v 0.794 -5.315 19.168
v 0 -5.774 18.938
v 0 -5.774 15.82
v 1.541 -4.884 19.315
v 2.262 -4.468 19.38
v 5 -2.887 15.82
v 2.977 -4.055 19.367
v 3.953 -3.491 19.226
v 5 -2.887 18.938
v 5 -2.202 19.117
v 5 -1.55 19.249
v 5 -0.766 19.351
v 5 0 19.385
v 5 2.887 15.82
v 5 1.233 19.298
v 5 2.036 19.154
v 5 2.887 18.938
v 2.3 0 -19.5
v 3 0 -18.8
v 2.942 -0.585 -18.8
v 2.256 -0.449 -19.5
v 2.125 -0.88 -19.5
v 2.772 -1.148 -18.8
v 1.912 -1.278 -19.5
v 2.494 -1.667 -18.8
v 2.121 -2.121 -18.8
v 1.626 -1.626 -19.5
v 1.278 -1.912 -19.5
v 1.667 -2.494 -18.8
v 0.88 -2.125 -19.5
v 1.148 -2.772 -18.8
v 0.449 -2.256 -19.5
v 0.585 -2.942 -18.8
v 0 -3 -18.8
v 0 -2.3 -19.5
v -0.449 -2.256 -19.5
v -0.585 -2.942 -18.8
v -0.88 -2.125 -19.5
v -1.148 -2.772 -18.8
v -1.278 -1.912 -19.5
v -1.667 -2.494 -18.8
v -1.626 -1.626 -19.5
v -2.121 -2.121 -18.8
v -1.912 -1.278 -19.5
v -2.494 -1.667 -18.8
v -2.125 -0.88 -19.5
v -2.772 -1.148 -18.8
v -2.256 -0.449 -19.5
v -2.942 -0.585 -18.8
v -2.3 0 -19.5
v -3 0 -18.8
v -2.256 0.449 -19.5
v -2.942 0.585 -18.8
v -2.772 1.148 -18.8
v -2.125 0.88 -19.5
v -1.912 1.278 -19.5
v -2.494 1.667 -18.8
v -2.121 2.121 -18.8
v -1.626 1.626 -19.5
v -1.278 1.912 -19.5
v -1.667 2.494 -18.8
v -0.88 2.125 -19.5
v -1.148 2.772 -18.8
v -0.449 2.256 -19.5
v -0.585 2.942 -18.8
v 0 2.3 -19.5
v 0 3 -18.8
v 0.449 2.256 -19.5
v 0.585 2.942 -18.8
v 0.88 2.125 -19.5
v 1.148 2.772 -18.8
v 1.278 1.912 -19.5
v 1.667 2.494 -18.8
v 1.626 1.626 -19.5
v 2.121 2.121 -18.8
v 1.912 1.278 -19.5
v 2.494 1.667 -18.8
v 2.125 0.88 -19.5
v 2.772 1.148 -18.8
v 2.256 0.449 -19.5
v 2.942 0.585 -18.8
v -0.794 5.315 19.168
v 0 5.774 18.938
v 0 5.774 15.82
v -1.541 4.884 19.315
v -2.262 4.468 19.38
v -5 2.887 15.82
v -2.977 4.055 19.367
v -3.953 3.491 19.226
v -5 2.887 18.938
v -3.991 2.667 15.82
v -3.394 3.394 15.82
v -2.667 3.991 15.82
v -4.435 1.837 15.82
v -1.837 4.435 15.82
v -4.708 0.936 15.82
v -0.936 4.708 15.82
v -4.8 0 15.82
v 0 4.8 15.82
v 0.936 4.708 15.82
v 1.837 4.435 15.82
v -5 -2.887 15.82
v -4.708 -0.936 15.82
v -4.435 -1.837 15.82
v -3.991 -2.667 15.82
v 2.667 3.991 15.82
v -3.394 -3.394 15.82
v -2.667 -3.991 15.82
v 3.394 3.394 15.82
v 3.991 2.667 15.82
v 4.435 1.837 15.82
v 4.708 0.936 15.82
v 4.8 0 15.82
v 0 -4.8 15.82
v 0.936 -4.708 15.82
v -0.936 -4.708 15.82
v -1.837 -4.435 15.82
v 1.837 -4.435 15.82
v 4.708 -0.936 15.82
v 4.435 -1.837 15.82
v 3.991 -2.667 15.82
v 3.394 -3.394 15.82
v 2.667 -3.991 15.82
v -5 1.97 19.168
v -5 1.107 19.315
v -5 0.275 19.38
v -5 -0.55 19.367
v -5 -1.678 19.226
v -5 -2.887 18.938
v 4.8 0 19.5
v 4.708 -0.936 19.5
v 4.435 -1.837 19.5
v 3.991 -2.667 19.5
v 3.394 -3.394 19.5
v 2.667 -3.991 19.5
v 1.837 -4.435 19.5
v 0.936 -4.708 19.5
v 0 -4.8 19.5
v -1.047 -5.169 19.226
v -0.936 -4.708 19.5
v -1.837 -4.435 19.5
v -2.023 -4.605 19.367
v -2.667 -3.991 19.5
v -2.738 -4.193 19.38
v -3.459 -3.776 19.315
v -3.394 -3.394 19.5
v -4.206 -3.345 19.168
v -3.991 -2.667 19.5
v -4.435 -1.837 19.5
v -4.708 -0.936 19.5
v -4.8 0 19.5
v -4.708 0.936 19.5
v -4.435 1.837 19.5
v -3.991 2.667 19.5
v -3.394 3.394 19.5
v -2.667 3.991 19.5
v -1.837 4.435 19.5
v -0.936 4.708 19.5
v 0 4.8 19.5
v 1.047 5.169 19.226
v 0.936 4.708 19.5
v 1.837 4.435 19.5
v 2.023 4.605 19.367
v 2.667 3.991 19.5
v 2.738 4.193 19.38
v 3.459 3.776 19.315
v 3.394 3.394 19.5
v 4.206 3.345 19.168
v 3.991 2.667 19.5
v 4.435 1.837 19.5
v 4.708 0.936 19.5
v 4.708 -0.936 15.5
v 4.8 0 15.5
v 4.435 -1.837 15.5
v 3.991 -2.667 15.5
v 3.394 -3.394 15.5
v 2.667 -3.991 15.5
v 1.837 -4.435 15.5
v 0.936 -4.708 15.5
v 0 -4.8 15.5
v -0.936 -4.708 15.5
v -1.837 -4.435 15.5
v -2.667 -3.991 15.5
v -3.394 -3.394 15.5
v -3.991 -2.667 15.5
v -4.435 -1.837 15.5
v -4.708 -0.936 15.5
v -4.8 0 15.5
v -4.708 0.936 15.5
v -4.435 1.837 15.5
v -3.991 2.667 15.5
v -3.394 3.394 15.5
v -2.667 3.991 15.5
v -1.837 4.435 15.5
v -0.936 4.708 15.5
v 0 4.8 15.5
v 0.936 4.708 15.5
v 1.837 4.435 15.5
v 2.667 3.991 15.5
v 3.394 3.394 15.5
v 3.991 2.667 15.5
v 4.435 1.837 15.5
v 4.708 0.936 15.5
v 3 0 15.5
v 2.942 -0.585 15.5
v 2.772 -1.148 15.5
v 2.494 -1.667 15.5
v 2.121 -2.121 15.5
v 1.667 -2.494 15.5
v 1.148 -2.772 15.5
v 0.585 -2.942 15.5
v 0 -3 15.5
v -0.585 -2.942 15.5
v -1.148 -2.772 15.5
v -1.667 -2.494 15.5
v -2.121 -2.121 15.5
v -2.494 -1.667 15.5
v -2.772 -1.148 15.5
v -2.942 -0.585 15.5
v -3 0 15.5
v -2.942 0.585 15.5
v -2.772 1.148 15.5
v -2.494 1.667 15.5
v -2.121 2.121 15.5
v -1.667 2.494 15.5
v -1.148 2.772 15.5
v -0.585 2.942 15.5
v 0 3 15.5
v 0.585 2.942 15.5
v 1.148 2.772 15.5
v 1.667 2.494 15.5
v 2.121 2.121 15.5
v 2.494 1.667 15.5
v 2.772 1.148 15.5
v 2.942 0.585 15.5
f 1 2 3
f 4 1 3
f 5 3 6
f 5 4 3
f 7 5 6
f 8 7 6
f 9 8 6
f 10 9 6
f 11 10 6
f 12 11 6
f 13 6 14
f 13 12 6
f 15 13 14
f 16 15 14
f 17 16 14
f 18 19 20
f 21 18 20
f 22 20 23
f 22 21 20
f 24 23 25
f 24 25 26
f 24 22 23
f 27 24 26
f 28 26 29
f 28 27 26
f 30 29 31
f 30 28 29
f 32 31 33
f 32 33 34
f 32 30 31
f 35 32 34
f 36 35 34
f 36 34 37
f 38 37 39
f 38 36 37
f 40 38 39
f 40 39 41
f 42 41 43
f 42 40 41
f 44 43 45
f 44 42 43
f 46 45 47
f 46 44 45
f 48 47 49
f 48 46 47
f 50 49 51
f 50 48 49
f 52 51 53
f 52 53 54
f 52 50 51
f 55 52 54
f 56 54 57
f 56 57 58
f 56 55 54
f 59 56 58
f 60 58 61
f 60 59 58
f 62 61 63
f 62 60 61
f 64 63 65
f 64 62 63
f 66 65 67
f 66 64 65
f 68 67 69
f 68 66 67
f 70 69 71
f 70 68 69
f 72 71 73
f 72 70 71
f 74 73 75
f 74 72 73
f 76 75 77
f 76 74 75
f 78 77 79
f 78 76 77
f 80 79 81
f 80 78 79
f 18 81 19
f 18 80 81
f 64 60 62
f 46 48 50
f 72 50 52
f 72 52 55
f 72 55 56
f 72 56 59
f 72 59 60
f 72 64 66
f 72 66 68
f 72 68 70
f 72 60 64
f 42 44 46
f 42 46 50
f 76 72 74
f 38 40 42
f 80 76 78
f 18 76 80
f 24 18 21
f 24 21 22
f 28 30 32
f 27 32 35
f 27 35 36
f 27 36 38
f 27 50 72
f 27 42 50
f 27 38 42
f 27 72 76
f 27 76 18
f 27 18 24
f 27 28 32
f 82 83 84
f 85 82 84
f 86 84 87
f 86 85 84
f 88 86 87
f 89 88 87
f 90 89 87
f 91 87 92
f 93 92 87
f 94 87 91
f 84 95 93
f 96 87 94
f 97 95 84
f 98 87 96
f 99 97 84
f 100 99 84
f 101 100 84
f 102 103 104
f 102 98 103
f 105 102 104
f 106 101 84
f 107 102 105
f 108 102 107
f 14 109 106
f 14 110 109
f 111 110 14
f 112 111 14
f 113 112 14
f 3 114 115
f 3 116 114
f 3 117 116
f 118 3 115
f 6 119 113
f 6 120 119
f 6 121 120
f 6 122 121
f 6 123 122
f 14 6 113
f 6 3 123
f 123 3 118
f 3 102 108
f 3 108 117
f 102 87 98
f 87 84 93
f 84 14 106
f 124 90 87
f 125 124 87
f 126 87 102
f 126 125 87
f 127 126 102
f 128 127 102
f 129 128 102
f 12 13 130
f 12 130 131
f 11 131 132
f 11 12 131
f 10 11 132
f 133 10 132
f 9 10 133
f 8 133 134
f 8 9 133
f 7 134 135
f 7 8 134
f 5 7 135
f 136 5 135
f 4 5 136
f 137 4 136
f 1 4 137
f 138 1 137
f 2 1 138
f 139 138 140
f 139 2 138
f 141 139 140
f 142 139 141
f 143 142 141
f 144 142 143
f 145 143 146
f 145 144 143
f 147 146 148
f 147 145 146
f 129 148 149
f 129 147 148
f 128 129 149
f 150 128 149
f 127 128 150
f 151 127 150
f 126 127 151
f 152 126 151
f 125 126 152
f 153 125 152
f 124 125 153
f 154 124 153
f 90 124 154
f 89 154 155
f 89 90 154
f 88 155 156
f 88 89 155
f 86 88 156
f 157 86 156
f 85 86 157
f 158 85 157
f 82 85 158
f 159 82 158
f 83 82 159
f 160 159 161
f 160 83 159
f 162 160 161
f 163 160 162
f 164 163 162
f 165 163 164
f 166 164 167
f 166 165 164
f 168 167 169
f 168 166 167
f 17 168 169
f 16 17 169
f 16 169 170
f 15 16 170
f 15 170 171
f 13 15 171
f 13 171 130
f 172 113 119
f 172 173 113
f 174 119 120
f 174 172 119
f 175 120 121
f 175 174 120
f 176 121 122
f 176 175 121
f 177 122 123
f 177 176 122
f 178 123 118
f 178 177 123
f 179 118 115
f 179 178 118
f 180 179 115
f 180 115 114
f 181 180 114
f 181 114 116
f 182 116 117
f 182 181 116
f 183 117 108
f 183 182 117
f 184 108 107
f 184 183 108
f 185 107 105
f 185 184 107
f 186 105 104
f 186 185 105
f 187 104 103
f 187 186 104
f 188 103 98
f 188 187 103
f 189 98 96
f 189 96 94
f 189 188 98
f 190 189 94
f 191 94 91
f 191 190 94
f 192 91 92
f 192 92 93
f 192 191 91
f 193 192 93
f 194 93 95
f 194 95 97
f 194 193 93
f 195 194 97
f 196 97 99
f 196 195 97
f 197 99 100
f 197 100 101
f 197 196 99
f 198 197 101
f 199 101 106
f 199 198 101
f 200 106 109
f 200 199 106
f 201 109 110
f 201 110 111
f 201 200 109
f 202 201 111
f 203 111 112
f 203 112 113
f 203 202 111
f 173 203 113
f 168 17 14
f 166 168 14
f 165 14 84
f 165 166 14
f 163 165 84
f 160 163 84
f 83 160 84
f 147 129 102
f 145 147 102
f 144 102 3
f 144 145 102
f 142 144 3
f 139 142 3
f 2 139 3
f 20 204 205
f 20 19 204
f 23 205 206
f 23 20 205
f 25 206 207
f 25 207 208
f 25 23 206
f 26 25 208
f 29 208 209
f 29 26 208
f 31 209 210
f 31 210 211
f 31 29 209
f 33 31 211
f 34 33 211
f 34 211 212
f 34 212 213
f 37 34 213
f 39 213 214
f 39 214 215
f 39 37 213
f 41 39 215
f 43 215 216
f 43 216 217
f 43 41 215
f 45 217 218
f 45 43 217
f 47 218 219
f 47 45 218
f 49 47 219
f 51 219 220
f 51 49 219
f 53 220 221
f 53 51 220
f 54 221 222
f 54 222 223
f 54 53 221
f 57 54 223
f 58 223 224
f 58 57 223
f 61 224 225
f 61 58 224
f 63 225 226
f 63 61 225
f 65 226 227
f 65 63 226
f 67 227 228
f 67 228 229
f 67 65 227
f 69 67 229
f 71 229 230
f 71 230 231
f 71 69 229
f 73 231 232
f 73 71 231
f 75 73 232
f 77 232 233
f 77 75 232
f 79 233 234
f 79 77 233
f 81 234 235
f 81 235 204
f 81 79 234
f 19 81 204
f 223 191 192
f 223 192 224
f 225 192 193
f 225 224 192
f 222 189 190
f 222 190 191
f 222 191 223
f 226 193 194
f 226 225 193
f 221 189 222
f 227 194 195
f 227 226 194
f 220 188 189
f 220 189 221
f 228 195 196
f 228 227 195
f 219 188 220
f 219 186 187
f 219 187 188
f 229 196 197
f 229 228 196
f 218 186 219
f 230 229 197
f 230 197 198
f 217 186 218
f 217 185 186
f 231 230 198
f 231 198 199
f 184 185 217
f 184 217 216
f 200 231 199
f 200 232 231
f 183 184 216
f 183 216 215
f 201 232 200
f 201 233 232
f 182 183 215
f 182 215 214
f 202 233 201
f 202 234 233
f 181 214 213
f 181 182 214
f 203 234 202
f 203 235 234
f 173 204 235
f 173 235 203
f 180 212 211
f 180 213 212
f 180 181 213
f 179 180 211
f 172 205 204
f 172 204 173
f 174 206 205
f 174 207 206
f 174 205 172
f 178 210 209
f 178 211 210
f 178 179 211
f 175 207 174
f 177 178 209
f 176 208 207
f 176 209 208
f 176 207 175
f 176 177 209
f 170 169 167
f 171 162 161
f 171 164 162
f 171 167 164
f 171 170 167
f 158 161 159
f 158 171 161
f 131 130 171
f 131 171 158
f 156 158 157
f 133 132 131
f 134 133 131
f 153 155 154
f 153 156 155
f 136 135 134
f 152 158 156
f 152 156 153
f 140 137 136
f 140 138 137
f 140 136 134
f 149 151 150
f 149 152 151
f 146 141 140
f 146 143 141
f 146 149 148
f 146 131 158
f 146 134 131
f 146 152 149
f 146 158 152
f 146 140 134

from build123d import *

# Parameters (mm, degrees)
SKETCH4_OUTSIDE_W  = 22.004
SKETCH4_OUTSIDE_H  = 22.004
CUT_EXTRUDE1_DEPTH = 40.845535091


with BuildPart() as part:
    # Sketch3 → Revolve1 (revolve)
    with BuildSketch(Plane(origin=(0, 0, 0), x_dir=(0, 0, -1), z_dir=(1, 0, 0))):
        Polygon((-19.5, 0), (-19.5, 4.8), (-18.937947959, 5.773502692), (-15.82, 5.773502692), (-15.82, 4.8), (-15.5, 4.8), (-15.5, 3), (18.8, 3), (19.5, 2.3), (19.5, 0), align=None)
    revolve(axis=Axis((0, 0, 19.5), (0, 0, -1)))

    # Sketch4 outside → Cut-Extrude1 (cut, through all)
    with BuildSketch(Plane.XY.offset(19.5)):
        Rectangle(SKETCH4_OUTSIDE_W, SKETCH4_OUTSIDE_H)
        Polygon((5, 2.886751346), (0, 5.773502692), (-5, 2.886751346), (-5, -2.886751346), (0, -5.773502692), (5, -2.886751346), align=None, mode=Mode.SUBTRACT)
    extrude(amount=-CUT_EXTRUDE1_DEPTH, mode=Mode.SUBTRACT)


solid = part.part
